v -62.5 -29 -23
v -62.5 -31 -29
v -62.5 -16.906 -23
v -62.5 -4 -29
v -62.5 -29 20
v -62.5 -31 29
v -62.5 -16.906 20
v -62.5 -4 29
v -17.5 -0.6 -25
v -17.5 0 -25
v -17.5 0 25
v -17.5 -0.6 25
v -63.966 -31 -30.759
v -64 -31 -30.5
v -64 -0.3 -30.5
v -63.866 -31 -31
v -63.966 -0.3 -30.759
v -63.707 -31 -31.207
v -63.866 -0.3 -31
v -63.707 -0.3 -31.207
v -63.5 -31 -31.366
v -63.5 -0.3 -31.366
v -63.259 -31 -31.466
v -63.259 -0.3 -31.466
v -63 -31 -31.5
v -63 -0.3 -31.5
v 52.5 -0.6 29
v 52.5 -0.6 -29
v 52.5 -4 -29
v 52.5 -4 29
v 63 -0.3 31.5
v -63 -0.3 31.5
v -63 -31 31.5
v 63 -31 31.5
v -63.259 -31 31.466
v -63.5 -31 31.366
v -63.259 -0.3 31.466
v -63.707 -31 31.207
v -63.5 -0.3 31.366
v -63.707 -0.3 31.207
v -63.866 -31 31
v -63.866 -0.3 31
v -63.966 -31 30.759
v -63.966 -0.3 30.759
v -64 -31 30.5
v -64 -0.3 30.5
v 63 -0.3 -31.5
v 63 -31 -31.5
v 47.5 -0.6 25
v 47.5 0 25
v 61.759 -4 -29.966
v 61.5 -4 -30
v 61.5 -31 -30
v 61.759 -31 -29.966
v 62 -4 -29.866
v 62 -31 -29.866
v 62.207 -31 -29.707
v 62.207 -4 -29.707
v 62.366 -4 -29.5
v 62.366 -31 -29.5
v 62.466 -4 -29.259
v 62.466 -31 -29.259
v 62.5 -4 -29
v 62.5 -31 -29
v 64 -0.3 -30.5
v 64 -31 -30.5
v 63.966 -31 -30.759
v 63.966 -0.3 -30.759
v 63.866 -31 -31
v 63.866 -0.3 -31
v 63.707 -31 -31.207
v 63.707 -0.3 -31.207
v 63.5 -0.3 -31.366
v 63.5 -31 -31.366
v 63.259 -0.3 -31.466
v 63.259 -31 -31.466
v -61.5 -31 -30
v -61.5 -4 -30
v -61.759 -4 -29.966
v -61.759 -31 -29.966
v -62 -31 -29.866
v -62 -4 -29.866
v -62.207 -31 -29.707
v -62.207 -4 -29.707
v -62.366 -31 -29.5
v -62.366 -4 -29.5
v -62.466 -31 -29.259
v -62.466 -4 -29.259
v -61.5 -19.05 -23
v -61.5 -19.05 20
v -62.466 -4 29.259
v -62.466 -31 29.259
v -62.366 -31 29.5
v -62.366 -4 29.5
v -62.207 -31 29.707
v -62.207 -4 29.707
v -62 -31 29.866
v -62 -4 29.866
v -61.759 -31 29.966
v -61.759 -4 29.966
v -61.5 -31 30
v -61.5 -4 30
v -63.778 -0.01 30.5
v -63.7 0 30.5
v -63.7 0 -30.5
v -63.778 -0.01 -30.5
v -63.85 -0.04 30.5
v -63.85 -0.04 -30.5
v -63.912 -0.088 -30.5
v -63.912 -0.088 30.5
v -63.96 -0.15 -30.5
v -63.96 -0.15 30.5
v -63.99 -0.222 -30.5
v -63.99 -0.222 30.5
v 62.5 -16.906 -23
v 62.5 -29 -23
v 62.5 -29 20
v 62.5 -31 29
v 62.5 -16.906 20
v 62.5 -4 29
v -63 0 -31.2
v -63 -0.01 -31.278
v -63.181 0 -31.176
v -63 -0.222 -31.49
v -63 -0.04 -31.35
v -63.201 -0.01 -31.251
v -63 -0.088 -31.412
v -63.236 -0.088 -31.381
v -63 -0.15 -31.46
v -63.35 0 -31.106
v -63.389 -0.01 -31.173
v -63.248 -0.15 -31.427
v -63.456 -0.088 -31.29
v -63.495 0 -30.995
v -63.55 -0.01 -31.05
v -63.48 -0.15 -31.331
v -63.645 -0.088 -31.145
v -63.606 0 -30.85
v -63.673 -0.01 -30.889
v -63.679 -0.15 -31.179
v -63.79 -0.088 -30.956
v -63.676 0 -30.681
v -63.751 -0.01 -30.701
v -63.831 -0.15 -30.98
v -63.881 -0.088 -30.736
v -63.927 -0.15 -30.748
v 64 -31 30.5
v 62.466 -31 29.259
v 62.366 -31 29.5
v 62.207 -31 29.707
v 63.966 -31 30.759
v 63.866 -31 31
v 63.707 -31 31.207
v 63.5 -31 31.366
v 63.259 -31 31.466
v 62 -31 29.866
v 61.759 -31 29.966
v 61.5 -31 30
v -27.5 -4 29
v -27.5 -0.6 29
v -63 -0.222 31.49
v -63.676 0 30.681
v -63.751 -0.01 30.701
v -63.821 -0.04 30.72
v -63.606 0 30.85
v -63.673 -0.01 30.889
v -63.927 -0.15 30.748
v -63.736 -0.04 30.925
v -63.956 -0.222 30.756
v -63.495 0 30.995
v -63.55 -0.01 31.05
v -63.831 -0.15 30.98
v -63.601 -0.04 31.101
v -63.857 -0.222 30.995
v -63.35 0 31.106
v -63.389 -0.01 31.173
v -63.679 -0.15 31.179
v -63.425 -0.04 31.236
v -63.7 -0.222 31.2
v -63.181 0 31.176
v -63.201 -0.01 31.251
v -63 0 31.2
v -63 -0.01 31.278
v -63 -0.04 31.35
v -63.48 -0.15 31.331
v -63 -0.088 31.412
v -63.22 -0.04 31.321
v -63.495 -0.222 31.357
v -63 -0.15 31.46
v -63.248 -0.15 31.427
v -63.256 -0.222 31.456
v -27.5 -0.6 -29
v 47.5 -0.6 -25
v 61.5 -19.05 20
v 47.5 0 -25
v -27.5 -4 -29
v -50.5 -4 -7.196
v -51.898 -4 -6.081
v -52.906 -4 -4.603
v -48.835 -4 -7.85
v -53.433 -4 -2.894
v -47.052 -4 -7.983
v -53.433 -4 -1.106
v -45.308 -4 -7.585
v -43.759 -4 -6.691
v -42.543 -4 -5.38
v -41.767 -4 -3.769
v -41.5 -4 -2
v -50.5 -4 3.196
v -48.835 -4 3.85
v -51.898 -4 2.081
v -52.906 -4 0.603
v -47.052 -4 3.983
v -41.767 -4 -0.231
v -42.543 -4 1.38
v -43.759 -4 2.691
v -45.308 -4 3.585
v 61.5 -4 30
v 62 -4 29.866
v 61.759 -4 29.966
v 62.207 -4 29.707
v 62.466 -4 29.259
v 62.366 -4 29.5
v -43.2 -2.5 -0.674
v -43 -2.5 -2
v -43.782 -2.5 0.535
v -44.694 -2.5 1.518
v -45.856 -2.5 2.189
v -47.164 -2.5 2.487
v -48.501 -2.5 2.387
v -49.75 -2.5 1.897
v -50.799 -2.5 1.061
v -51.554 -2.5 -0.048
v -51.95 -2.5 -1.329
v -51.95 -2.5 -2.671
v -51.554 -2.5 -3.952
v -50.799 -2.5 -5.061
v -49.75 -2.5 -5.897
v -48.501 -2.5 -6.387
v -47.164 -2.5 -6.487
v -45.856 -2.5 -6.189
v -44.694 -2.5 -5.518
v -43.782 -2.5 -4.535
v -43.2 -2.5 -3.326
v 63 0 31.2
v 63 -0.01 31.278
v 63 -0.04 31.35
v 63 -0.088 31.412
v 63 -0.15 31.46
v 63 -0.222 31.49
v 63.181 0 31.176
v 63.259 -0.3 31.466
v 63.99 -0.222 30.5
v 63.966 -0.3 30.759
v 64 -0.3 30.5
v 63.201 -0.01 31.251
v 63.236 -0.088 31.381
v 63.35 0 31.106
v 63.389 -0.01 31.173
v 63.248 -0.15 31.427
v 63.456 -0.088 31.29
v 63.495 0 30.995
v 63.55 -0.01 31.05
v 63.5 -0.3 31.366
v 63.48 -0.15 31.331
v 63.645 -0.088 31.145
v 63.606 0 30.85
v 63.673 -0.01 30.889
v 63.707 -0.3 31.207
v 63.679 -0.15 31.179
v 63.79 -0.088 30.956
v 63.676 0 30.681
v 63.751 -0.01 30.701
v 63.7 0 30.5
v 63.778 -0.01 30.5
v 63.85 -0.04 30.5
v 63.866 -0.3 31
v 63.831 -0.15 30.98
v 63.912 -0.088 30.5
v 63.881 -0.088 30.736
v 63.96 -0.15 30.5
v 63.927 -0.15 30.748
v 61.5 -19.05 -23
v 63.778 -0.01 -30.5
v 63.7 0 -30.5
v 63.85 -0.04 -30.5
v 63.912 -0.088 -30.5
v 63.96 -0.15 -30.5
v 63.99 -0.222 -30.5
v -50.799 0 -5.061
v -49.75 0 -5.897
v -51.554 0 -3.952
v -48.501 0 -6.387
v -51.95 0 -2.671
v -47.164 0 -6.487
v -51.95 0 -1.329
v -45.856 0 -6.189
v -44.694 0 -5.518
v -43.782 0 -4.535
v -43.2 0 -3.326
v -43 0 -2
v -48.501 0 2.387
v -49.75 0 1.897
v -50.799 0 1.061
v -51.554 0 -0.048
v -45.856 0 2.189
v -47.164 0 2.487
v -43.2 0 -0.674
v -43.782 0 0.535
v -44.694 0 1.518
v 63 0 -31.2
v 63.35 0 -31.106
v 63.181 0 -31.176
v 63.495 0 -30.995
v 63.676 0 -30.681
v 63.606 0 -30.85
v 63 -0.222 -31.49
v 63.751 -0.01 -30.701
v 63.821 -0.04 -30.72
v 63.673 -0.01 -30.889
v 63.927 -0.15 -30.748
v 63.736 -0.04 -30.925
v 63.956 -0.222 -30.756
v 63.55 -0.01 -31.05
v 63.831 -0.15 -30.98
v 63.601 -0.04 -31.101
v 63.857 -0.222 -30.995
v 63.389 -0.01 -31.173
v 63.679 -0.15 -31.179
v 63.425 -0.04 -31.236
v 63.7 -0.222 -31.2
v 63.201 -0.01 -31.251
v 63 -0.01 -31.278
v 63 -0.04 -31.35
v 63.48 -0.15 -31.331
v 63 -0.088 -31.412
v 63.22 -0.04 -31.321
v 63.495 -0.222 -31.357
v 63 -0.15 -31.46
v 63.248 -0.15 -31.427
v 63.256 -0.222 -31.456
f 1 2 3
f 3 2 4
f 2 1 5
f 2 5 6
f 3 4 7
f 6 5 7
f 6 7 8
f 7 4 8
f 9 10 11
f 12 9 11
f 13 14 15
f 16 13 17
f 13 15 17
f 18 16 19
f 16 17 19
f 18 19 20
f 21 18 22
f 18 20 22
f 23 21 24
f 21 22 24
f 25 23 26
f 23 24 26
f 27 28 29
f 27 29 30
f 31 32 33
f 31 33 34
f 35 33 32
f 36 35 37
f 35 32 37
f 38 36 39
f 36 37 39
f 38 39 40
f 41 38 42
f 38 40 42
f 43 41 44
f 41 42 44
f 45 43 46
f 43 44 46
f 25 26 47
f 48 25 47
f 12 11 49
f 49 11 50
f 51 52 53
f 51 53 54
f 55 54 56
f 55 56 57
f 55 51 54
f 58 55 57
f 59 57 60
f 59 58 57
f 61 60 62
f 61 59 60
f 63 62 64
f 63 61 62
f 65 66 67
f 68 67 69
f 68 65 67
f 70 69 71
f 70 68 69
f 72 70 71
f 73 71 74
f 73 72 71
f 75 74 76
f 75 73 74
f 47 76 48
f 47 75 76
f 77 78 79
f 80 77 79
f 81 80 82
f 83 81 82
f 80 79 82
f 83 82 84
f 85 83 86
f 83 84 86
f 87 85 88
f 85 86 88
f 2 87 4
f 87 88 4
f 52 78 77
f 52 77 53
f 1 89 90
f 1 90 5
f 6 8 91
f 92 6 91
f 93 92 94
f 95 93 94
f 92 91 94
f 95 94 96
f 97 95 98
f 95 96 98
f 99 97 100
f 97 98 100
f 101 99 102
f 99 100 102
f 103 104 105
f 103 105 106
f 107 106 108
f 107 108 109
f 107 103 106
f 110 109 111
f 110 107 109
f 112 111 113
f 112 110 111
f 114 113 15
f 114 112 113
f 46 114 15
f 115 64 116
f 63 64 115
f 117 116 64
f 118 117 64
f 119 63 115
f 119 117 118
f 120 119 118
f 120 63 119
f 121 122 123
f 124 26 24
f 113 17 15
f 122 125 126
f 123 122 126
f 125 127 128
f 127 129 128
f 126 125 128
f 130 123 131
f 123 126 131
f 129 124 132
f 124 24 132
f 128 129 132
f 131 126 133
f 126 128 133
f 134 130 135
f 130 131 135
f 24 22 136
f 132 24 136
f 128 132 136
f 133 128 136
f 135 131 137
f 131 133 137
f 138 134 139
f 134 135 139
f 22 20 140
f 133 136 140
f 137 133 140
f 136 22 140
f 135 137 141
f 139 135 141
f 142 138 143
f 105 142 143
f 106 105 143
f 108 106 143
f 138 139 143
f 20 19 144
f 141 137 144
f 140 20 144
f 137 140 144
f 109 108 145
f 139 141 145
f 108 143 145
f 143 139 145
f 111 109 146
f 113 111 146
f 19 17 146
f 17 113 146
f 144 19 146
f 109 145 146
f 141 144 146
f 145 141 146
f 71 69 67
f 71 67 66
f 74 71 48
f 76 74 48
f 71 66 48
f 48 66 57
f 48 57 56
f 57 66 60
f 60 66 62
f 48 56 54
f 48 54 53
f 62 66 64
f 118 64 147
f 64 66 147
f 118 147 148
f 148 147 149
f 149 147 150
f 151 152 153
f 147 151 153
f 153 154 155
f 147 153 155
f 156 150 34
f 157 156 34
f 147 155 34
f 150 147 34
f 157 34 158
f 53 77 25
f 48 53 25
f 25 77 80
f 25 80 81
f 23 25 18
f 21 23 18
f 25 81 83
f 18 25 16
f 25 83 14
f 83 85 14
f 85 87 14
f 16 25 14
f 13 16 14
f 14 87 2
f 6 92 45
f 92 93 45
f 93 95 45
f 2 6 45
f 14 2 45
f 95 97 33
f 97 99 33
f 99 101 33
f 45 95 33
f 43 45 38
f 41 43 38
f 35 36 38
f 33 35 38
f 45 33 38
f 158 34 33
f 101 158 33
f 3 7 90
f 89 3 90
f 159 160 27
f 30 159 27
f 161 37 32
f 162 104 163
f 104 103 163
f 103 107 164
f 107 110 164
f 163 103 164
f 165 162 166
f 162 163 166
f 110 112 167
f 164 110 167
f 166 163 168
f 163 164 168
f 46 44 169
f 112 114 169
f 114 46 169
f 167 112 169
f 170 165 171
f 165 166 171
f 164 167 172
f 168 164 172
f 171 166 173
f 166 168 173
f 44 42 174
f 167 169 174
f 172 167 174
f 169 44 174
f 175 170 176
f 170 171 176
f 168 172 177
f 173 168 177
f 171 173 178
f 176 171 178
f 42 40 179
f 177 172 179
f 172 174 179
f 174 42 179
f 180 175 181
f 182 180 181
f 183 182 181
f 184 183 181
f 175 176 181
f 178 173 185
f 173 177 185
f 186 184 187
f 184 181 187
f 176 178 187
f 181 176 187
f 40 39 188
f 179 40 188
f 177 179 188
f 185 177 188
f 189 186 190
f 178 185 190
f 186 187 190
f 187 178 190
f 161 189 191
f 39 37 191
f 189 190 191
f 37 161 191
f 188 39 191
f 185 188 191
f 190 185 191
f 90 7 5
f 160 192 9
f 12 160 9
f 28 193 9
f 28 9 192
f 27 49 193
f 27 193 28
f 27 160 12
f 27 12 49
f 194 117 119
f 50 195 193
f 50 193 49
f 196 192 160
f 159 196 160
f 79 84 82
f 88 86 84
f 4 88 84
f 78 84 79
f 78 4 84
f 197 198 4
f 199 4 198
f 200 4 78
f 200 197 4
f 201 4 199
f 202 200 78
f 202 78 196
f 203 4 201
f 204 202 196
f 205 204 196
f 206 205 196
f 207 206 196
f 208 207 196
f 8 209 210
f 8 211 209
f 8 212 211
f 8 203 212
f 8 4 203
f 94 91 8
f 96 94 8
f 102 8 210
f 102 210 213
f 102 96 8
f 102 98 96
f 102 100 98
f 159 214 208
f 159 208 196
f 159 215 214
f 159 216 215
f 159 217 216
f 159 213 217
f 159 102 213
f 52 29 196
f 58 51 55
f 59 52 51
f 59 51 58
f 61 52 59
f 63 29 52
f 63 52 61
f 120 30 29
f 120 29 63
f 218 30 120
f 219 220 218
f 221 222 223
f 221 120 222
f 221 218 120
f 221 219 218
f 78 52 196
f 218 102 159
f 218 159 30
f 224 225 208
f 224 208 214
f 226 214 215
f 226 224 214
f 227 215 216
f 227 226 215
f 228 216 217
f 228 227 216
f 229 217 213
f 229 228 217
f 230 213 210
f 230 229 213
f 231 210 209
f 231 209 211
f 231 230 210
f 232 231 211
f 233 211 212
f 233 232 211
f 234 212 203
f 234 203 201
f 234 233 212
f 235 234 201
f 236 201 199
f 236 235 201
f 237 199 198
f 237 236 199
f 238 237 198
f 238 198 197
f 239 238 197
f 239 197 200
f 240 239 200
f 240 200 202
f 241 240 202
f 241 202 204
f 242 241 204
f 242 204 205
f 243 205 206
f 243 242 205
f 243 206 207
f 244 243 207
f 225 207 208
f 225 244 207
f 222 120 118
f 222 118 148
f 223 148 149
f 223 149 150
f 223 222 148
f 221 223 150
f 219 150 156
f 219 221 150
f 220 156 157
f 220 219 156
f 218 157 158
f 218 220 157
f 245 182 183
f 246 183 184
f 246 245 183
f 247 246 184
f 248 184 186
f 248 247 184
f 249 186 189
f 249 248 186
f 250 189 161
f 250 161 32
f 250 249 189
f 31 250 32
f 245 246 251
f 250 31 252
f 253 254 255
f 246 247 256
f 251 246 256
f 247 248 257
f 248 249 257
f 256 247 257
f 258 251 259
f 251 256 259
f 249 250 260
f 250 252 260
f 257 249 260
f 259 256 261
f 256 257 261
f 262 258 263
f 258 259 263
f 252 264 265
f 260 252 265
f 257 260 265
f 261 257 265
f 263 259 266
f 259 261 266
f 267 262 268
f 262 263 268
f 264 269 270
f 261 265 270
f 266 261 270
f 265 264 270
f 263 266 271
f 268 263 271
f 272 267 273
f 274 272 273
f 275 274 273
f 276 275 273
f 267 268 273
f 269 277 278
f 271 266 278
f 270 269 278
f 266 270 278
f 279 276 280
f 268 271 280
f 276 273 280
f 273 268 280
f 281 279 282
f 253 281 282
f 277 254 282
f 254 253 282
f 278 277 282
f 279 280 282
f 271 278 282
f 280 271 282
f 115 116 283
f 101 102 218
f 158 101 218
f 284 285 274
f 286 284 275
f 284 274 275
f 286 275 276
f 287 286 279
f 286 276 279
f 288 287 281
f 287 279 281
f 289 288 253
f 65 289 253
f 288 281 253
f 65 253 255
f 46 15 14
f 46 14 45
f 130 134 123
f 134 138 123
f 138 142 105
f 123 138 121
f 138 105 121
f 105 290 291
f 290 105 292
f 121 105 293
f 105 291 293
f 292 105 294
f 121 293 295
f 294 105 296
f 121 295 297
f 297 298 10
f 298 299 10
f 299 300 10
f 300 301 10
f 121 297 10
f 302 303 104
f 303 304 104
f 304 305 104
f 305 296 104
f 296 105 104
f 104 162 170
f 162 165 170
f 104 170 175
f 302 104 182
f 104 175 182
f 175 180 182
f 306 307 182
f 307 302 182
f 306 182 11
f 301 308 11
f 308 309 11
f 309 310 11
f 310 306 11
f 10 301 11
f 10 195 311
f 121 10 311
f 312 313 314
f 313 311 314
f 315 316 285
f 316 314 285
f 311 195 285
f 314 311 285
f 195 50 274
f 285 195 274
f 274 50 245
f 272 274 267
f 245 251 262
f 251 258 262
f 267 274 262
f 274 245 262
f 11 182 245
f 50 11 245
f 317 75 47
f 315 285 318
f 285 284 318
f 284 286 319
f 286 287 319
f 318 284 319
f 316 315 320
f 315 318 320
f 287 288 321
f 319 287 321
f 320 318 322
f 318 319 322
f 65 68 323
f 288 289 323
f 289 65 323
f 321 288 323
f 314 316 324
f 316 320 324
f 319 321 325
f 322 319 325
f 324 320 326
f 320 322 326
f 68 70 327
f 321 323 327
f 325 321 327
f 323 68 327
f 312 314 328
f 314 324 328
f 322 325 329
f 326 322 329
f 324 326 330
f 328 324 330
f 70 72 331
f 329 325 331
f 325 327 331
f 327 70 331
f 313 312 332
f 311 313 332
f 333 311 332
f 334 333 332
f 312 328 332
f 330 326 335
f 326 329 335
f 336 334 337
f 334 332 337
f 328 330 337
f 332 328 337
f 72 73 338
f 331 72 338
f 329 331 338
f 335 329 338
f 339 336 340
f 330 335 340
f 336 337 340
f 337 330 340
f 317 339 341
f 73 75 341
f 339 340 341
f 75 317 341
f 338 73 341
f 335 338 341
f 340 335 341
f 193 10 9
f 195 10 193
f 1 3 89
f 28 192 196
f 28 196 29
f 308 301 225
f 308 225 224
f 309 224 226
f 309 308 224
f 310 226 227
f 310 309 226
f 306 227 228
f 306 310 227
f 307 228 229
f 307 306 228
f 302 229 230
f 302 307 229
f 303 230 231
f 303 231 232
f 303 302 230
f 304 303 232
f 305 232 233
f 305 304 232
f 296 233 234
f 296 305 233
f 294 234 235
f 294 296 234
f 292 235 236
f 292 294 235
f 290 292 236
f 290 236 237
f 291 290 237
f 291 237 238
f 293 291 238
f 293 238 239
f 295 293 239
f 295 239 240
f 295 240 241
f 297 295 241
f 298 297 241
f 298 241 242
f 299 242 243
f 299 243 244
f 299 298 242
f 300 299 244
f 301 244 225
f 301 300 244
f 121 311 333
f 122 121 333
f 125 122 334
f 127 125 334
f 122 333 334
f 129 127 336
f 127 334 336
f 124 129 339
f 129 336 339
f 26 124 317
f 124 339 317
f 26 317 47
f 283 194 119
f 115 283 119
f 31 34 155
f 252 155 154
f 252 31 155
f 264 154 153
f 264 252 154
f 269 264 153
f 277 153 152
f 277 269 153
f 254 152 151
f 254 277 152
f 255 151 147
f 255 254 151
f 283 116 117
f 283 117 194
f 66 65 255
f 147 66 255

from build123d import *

# Parameters (mm, degrees)
F0_W         = 128
F0_H         = 63
F0_W_2       = 125
F0_H_2       = 60
F1_DEPTH     = 31
F0_R         = 4.5
F0_W_3       = 80
F0_H_3       = 58
F0_W_4       = 65
F0_H_4       = 50
F2_DEPTH     = 4
F3_START     = 0.6
F3_DEPTH     = 3.4
F4_R         = 0.3
F6_START     = 10
F6_DEPTH     = 43
F7_W         = 6
F7_H         = 60
F8_DEPTH     = 1
F9_T1_DEPTH  = 29.5
F9_T3_DEPTH  = 33.5
F9_T6_ANGLE  = 90
F9_T8_ANGLE  = 90
F9_T10_ANGLE = 90
F9_T12_ANGLE = 90
F10_SIZE     = 1.5


# Not quite as in the source:
# - a fillet or chamfer that OpenCascade refuses, or shapes differently, is made with other operations: its cross-section is extruded or revolved along the edge and cut away or added


with BuildPart() as f1:
    # F0 (on Front) → F1 (new body)
    with BuildSketch(Plane.XZ):
        Rectangle(F0_W, F0_H)
        Rectangle(F0_W_2, F0_H_2, mode=Mode.SUBTRACT)
    extrude(amount=F1_DEPTH)

    # F0 (on Front) → F2 (join)
    with BuildSketch(Plane.XZ):
        Rectangle(F0_W_2, F0_H_2)
        with Locations((-47.5, -2)):
            Circle(F0_R, mode=Mode.SUBTRACT)
        with Locations((12.5, 0)):
            Rectangle(F0_W_3, F0_H_3, mode=Mode.SUBTRACT)
        with Locations((12.5, 0)):
            Rectangle(F0_W_3, F0_H_3)
        with Locations((15, 0)):
            Rectangle(F0_W_4, F0_H_4, mode=Mode.SUBTRACT)
    extrude(amount=F2_DEPTH)

    # F0 (on Front) → F3 (cut)
    with BuildSketch(Plane.XZ.offset(F3_START)):
        with Locations((12.5, 0)):
            Rectangle(F0_W_3, F0_H_3)
        with Locations((15, 0)):
            Rectangle(F0_W_4, F0_H_4, mode=Mode.SUBTRACT)
    extrude(amount=F3_DEPTH, mode=Mode.SUBTRACT)

    # F4
    f4_edges = [f1.edges().sort_by_distance(p)[0] for p in [
        (64, 0, 0),
        (0, 0, 31.5),
        (-64, 0, 0),
        (0, 0, -31.5),
    ]]
    fillet(f4_edges, radius=F4_R)

    # F5 (on face) → F6 (join)
    with BuildSketch(Plane(origin=(0, 0, 30), x_dir=(1, 0, 0), z_dir=(0, 0, -1)).offset(F6_START)):
        Polygon((-61.5, 19.0501256289), (-62.5, 29), (-62.5, 16.9056187084), align=None)
        Polygon((62.5, 16.9056187084), (62.5, 29), (61.5, 19.0501256289), align=None)
    extrude(amount=F6_DEPTH)

    # F7 (on face) → F8 (join)
    with BuildSketch(Plane.XZ):
        with Locations((-30.5, 0)):
            Rectangle(F7_W, F7_H)
        with Locations((55.5, 0)):
            Rectangle(F7_W, F7_H)
    extrude(amount=F8_DEPTH)

    # F9: fillet of radius 1 on 8 edges, made by hand

    # F9_s2 → F9_t1 (join)
    with BuildSketch(Plane.XZ.offset(1.5)):
        with BuildLine():
            ThreePointArc((62.5, 29), (62.2071067812, 29.7071067812), (61.5, 30))
            Line((61.5, 30), (62.5, 30))
            Line((62.5, 30), (62.5, 29))
        make_face()
        with BuildLine():
            ThreePointArc((-62.5, 29), (-62.2071067812, 29.7071067812), (-61.5, 30))
            Line((-61.5, 30), (-62.5, 30))
            Line((-62.5, 30), (-62.5, 29))
        make_face()
        with BuildLine():
            ThreePointArc((-61.5, -30), (-62.2071067812, -29.7071067812), (-62.5, -29))
            Line((-62.5, -29), (-62.5, -30))
            Line((-62.5, -30), (-61.5, -30))
        make_face()
        with BuildLine():
            ThreePointArc((61.5, -30), (62.2071067812, -29.7071067812), (62.5, -29))
            Line((62.5, -29), (62.5, -30))
            Line((62.5, -30), (61.5, -30))
        make_face()
    extrude(amount=F9_T1_DEPTH)

    # F9_s4 → F9_t3 (cut)
    with BuildSketch(Plane.XZ):
        with BuildLine():
            ThreePointArc((63, 31.5), (63.7071067812, 31.2071067812), (64, 30.5))
            Line((64, 30.5), (64, 31.5))
            Line((64, 31.5), (63, 31.5))
        make_face()
        with BuildLine():
            ThreePointArc((64, -30.5), (63.7071067812, -31.2071067812), (63, -31.5))
            Line((63, -31.5), (64, -31.5))
            Line((64, -31.5), (64, -30.5))
        make_face()
        with BuildLine():
            ThreePointArc((-63, 31.5), (-63.7071067812, 31.2071067812), (-64, 30.5))
            Line((-64, 30.5), (-64, 31.5))
            Line((-64, 31.5), (-63, 31.5))
        make_face()
        with BuildLine():
            ThreePointArc((-64, -30.5), (-63.7071067812, -31.2071067812), (-63, -31.5))
            Line((-63, -31.5), (-64, -31.5))
            Line((-64, -31.5), (-64, -30.5))
        make_face()
    extrude(amount=F9_T3_DEPTH, mode=Mode.SUBTRACT)

    # F9_s5 → F9_t6 (revolve, cut)
    with BuildSketch(Plane.YZ.offset(-63)):
        with BuildLine():
            ThreePointArc((0, -31.2), (-0.0878679656, -31.4121320344), (-0.3, -31.5))
            Line((-0.3, -31.5), (0, -31.5))
            Line((0, -31.5), (0, -31.2))
        make_face()
    revolve(axis=Axis((-63, 0, -30.5), (0, 1, 0)), revolution_arc=F9_T6_ANGLE, mode=Mode.SUBTRACT)

    # F9_s7 → F9_t8 (revolve, cut)
    with BuildSketch(Plane.XY.offset(30.5)):
        with BuildLine():
            ThreePointArc((-63.7, 0), (-63.9121320344, -0.0878679656), (-64, -0.3))
            Line((-64, -0.3), (-64, 0))
            Line((-64, 0), (-63.7, 0))
        make_face()
    revolve(axis=Axis((-63, 0, 30.5), (0, 1, 0)), revolution_arc=F9_T8_ANGLE, mode=Mode.SUBTRACT)

    # F9_s9 → F9_t10 (revolve, cut)
    with BuildSketch(Plane.XY.offset(-30.5)):
        with BuildLine():
            ThreePointArc((63.7, 0), (63.9121320344, -0.0878679656), (64, -0.3))
            Line((64, -0.3), (64, 0))
            Line((64, 0), (63.7, 0))
        make_face()
    revolve(axis=Axis((63, 0, -30.5), (0, 1, 0)), revolution_arc=F9_T10_ANGLE, mode=Mode.SUBTRACT)

    # F9_s11 → F9_t12 (revolve, cut)
    with BuildSketch(Plane.YZ.offset(63)):
        with BuildLine():
            ThreePointArc((0, 31.2), (-0.0878679656, 31.4121320344), (-0.3, 31.5))
            Line((-0.3, 31.5), (0, 31.5))
            Line((0, 31.5), (0, 31.2))
        make_face()
    revolve(axis=Axis((63, 0, 30.5), (0, 1, 0)), revolution_arc=F9_T12_ANGLE, mode=Mode.SUBTRACT)

    # F10
    f10_edges = [f1.edges().sort_by_distance(p)[0] for p in [
        (-52, -4, -2),
    ]]
    chamfer(f10_edges, length=F10_SIZE)


solid = f1.part
